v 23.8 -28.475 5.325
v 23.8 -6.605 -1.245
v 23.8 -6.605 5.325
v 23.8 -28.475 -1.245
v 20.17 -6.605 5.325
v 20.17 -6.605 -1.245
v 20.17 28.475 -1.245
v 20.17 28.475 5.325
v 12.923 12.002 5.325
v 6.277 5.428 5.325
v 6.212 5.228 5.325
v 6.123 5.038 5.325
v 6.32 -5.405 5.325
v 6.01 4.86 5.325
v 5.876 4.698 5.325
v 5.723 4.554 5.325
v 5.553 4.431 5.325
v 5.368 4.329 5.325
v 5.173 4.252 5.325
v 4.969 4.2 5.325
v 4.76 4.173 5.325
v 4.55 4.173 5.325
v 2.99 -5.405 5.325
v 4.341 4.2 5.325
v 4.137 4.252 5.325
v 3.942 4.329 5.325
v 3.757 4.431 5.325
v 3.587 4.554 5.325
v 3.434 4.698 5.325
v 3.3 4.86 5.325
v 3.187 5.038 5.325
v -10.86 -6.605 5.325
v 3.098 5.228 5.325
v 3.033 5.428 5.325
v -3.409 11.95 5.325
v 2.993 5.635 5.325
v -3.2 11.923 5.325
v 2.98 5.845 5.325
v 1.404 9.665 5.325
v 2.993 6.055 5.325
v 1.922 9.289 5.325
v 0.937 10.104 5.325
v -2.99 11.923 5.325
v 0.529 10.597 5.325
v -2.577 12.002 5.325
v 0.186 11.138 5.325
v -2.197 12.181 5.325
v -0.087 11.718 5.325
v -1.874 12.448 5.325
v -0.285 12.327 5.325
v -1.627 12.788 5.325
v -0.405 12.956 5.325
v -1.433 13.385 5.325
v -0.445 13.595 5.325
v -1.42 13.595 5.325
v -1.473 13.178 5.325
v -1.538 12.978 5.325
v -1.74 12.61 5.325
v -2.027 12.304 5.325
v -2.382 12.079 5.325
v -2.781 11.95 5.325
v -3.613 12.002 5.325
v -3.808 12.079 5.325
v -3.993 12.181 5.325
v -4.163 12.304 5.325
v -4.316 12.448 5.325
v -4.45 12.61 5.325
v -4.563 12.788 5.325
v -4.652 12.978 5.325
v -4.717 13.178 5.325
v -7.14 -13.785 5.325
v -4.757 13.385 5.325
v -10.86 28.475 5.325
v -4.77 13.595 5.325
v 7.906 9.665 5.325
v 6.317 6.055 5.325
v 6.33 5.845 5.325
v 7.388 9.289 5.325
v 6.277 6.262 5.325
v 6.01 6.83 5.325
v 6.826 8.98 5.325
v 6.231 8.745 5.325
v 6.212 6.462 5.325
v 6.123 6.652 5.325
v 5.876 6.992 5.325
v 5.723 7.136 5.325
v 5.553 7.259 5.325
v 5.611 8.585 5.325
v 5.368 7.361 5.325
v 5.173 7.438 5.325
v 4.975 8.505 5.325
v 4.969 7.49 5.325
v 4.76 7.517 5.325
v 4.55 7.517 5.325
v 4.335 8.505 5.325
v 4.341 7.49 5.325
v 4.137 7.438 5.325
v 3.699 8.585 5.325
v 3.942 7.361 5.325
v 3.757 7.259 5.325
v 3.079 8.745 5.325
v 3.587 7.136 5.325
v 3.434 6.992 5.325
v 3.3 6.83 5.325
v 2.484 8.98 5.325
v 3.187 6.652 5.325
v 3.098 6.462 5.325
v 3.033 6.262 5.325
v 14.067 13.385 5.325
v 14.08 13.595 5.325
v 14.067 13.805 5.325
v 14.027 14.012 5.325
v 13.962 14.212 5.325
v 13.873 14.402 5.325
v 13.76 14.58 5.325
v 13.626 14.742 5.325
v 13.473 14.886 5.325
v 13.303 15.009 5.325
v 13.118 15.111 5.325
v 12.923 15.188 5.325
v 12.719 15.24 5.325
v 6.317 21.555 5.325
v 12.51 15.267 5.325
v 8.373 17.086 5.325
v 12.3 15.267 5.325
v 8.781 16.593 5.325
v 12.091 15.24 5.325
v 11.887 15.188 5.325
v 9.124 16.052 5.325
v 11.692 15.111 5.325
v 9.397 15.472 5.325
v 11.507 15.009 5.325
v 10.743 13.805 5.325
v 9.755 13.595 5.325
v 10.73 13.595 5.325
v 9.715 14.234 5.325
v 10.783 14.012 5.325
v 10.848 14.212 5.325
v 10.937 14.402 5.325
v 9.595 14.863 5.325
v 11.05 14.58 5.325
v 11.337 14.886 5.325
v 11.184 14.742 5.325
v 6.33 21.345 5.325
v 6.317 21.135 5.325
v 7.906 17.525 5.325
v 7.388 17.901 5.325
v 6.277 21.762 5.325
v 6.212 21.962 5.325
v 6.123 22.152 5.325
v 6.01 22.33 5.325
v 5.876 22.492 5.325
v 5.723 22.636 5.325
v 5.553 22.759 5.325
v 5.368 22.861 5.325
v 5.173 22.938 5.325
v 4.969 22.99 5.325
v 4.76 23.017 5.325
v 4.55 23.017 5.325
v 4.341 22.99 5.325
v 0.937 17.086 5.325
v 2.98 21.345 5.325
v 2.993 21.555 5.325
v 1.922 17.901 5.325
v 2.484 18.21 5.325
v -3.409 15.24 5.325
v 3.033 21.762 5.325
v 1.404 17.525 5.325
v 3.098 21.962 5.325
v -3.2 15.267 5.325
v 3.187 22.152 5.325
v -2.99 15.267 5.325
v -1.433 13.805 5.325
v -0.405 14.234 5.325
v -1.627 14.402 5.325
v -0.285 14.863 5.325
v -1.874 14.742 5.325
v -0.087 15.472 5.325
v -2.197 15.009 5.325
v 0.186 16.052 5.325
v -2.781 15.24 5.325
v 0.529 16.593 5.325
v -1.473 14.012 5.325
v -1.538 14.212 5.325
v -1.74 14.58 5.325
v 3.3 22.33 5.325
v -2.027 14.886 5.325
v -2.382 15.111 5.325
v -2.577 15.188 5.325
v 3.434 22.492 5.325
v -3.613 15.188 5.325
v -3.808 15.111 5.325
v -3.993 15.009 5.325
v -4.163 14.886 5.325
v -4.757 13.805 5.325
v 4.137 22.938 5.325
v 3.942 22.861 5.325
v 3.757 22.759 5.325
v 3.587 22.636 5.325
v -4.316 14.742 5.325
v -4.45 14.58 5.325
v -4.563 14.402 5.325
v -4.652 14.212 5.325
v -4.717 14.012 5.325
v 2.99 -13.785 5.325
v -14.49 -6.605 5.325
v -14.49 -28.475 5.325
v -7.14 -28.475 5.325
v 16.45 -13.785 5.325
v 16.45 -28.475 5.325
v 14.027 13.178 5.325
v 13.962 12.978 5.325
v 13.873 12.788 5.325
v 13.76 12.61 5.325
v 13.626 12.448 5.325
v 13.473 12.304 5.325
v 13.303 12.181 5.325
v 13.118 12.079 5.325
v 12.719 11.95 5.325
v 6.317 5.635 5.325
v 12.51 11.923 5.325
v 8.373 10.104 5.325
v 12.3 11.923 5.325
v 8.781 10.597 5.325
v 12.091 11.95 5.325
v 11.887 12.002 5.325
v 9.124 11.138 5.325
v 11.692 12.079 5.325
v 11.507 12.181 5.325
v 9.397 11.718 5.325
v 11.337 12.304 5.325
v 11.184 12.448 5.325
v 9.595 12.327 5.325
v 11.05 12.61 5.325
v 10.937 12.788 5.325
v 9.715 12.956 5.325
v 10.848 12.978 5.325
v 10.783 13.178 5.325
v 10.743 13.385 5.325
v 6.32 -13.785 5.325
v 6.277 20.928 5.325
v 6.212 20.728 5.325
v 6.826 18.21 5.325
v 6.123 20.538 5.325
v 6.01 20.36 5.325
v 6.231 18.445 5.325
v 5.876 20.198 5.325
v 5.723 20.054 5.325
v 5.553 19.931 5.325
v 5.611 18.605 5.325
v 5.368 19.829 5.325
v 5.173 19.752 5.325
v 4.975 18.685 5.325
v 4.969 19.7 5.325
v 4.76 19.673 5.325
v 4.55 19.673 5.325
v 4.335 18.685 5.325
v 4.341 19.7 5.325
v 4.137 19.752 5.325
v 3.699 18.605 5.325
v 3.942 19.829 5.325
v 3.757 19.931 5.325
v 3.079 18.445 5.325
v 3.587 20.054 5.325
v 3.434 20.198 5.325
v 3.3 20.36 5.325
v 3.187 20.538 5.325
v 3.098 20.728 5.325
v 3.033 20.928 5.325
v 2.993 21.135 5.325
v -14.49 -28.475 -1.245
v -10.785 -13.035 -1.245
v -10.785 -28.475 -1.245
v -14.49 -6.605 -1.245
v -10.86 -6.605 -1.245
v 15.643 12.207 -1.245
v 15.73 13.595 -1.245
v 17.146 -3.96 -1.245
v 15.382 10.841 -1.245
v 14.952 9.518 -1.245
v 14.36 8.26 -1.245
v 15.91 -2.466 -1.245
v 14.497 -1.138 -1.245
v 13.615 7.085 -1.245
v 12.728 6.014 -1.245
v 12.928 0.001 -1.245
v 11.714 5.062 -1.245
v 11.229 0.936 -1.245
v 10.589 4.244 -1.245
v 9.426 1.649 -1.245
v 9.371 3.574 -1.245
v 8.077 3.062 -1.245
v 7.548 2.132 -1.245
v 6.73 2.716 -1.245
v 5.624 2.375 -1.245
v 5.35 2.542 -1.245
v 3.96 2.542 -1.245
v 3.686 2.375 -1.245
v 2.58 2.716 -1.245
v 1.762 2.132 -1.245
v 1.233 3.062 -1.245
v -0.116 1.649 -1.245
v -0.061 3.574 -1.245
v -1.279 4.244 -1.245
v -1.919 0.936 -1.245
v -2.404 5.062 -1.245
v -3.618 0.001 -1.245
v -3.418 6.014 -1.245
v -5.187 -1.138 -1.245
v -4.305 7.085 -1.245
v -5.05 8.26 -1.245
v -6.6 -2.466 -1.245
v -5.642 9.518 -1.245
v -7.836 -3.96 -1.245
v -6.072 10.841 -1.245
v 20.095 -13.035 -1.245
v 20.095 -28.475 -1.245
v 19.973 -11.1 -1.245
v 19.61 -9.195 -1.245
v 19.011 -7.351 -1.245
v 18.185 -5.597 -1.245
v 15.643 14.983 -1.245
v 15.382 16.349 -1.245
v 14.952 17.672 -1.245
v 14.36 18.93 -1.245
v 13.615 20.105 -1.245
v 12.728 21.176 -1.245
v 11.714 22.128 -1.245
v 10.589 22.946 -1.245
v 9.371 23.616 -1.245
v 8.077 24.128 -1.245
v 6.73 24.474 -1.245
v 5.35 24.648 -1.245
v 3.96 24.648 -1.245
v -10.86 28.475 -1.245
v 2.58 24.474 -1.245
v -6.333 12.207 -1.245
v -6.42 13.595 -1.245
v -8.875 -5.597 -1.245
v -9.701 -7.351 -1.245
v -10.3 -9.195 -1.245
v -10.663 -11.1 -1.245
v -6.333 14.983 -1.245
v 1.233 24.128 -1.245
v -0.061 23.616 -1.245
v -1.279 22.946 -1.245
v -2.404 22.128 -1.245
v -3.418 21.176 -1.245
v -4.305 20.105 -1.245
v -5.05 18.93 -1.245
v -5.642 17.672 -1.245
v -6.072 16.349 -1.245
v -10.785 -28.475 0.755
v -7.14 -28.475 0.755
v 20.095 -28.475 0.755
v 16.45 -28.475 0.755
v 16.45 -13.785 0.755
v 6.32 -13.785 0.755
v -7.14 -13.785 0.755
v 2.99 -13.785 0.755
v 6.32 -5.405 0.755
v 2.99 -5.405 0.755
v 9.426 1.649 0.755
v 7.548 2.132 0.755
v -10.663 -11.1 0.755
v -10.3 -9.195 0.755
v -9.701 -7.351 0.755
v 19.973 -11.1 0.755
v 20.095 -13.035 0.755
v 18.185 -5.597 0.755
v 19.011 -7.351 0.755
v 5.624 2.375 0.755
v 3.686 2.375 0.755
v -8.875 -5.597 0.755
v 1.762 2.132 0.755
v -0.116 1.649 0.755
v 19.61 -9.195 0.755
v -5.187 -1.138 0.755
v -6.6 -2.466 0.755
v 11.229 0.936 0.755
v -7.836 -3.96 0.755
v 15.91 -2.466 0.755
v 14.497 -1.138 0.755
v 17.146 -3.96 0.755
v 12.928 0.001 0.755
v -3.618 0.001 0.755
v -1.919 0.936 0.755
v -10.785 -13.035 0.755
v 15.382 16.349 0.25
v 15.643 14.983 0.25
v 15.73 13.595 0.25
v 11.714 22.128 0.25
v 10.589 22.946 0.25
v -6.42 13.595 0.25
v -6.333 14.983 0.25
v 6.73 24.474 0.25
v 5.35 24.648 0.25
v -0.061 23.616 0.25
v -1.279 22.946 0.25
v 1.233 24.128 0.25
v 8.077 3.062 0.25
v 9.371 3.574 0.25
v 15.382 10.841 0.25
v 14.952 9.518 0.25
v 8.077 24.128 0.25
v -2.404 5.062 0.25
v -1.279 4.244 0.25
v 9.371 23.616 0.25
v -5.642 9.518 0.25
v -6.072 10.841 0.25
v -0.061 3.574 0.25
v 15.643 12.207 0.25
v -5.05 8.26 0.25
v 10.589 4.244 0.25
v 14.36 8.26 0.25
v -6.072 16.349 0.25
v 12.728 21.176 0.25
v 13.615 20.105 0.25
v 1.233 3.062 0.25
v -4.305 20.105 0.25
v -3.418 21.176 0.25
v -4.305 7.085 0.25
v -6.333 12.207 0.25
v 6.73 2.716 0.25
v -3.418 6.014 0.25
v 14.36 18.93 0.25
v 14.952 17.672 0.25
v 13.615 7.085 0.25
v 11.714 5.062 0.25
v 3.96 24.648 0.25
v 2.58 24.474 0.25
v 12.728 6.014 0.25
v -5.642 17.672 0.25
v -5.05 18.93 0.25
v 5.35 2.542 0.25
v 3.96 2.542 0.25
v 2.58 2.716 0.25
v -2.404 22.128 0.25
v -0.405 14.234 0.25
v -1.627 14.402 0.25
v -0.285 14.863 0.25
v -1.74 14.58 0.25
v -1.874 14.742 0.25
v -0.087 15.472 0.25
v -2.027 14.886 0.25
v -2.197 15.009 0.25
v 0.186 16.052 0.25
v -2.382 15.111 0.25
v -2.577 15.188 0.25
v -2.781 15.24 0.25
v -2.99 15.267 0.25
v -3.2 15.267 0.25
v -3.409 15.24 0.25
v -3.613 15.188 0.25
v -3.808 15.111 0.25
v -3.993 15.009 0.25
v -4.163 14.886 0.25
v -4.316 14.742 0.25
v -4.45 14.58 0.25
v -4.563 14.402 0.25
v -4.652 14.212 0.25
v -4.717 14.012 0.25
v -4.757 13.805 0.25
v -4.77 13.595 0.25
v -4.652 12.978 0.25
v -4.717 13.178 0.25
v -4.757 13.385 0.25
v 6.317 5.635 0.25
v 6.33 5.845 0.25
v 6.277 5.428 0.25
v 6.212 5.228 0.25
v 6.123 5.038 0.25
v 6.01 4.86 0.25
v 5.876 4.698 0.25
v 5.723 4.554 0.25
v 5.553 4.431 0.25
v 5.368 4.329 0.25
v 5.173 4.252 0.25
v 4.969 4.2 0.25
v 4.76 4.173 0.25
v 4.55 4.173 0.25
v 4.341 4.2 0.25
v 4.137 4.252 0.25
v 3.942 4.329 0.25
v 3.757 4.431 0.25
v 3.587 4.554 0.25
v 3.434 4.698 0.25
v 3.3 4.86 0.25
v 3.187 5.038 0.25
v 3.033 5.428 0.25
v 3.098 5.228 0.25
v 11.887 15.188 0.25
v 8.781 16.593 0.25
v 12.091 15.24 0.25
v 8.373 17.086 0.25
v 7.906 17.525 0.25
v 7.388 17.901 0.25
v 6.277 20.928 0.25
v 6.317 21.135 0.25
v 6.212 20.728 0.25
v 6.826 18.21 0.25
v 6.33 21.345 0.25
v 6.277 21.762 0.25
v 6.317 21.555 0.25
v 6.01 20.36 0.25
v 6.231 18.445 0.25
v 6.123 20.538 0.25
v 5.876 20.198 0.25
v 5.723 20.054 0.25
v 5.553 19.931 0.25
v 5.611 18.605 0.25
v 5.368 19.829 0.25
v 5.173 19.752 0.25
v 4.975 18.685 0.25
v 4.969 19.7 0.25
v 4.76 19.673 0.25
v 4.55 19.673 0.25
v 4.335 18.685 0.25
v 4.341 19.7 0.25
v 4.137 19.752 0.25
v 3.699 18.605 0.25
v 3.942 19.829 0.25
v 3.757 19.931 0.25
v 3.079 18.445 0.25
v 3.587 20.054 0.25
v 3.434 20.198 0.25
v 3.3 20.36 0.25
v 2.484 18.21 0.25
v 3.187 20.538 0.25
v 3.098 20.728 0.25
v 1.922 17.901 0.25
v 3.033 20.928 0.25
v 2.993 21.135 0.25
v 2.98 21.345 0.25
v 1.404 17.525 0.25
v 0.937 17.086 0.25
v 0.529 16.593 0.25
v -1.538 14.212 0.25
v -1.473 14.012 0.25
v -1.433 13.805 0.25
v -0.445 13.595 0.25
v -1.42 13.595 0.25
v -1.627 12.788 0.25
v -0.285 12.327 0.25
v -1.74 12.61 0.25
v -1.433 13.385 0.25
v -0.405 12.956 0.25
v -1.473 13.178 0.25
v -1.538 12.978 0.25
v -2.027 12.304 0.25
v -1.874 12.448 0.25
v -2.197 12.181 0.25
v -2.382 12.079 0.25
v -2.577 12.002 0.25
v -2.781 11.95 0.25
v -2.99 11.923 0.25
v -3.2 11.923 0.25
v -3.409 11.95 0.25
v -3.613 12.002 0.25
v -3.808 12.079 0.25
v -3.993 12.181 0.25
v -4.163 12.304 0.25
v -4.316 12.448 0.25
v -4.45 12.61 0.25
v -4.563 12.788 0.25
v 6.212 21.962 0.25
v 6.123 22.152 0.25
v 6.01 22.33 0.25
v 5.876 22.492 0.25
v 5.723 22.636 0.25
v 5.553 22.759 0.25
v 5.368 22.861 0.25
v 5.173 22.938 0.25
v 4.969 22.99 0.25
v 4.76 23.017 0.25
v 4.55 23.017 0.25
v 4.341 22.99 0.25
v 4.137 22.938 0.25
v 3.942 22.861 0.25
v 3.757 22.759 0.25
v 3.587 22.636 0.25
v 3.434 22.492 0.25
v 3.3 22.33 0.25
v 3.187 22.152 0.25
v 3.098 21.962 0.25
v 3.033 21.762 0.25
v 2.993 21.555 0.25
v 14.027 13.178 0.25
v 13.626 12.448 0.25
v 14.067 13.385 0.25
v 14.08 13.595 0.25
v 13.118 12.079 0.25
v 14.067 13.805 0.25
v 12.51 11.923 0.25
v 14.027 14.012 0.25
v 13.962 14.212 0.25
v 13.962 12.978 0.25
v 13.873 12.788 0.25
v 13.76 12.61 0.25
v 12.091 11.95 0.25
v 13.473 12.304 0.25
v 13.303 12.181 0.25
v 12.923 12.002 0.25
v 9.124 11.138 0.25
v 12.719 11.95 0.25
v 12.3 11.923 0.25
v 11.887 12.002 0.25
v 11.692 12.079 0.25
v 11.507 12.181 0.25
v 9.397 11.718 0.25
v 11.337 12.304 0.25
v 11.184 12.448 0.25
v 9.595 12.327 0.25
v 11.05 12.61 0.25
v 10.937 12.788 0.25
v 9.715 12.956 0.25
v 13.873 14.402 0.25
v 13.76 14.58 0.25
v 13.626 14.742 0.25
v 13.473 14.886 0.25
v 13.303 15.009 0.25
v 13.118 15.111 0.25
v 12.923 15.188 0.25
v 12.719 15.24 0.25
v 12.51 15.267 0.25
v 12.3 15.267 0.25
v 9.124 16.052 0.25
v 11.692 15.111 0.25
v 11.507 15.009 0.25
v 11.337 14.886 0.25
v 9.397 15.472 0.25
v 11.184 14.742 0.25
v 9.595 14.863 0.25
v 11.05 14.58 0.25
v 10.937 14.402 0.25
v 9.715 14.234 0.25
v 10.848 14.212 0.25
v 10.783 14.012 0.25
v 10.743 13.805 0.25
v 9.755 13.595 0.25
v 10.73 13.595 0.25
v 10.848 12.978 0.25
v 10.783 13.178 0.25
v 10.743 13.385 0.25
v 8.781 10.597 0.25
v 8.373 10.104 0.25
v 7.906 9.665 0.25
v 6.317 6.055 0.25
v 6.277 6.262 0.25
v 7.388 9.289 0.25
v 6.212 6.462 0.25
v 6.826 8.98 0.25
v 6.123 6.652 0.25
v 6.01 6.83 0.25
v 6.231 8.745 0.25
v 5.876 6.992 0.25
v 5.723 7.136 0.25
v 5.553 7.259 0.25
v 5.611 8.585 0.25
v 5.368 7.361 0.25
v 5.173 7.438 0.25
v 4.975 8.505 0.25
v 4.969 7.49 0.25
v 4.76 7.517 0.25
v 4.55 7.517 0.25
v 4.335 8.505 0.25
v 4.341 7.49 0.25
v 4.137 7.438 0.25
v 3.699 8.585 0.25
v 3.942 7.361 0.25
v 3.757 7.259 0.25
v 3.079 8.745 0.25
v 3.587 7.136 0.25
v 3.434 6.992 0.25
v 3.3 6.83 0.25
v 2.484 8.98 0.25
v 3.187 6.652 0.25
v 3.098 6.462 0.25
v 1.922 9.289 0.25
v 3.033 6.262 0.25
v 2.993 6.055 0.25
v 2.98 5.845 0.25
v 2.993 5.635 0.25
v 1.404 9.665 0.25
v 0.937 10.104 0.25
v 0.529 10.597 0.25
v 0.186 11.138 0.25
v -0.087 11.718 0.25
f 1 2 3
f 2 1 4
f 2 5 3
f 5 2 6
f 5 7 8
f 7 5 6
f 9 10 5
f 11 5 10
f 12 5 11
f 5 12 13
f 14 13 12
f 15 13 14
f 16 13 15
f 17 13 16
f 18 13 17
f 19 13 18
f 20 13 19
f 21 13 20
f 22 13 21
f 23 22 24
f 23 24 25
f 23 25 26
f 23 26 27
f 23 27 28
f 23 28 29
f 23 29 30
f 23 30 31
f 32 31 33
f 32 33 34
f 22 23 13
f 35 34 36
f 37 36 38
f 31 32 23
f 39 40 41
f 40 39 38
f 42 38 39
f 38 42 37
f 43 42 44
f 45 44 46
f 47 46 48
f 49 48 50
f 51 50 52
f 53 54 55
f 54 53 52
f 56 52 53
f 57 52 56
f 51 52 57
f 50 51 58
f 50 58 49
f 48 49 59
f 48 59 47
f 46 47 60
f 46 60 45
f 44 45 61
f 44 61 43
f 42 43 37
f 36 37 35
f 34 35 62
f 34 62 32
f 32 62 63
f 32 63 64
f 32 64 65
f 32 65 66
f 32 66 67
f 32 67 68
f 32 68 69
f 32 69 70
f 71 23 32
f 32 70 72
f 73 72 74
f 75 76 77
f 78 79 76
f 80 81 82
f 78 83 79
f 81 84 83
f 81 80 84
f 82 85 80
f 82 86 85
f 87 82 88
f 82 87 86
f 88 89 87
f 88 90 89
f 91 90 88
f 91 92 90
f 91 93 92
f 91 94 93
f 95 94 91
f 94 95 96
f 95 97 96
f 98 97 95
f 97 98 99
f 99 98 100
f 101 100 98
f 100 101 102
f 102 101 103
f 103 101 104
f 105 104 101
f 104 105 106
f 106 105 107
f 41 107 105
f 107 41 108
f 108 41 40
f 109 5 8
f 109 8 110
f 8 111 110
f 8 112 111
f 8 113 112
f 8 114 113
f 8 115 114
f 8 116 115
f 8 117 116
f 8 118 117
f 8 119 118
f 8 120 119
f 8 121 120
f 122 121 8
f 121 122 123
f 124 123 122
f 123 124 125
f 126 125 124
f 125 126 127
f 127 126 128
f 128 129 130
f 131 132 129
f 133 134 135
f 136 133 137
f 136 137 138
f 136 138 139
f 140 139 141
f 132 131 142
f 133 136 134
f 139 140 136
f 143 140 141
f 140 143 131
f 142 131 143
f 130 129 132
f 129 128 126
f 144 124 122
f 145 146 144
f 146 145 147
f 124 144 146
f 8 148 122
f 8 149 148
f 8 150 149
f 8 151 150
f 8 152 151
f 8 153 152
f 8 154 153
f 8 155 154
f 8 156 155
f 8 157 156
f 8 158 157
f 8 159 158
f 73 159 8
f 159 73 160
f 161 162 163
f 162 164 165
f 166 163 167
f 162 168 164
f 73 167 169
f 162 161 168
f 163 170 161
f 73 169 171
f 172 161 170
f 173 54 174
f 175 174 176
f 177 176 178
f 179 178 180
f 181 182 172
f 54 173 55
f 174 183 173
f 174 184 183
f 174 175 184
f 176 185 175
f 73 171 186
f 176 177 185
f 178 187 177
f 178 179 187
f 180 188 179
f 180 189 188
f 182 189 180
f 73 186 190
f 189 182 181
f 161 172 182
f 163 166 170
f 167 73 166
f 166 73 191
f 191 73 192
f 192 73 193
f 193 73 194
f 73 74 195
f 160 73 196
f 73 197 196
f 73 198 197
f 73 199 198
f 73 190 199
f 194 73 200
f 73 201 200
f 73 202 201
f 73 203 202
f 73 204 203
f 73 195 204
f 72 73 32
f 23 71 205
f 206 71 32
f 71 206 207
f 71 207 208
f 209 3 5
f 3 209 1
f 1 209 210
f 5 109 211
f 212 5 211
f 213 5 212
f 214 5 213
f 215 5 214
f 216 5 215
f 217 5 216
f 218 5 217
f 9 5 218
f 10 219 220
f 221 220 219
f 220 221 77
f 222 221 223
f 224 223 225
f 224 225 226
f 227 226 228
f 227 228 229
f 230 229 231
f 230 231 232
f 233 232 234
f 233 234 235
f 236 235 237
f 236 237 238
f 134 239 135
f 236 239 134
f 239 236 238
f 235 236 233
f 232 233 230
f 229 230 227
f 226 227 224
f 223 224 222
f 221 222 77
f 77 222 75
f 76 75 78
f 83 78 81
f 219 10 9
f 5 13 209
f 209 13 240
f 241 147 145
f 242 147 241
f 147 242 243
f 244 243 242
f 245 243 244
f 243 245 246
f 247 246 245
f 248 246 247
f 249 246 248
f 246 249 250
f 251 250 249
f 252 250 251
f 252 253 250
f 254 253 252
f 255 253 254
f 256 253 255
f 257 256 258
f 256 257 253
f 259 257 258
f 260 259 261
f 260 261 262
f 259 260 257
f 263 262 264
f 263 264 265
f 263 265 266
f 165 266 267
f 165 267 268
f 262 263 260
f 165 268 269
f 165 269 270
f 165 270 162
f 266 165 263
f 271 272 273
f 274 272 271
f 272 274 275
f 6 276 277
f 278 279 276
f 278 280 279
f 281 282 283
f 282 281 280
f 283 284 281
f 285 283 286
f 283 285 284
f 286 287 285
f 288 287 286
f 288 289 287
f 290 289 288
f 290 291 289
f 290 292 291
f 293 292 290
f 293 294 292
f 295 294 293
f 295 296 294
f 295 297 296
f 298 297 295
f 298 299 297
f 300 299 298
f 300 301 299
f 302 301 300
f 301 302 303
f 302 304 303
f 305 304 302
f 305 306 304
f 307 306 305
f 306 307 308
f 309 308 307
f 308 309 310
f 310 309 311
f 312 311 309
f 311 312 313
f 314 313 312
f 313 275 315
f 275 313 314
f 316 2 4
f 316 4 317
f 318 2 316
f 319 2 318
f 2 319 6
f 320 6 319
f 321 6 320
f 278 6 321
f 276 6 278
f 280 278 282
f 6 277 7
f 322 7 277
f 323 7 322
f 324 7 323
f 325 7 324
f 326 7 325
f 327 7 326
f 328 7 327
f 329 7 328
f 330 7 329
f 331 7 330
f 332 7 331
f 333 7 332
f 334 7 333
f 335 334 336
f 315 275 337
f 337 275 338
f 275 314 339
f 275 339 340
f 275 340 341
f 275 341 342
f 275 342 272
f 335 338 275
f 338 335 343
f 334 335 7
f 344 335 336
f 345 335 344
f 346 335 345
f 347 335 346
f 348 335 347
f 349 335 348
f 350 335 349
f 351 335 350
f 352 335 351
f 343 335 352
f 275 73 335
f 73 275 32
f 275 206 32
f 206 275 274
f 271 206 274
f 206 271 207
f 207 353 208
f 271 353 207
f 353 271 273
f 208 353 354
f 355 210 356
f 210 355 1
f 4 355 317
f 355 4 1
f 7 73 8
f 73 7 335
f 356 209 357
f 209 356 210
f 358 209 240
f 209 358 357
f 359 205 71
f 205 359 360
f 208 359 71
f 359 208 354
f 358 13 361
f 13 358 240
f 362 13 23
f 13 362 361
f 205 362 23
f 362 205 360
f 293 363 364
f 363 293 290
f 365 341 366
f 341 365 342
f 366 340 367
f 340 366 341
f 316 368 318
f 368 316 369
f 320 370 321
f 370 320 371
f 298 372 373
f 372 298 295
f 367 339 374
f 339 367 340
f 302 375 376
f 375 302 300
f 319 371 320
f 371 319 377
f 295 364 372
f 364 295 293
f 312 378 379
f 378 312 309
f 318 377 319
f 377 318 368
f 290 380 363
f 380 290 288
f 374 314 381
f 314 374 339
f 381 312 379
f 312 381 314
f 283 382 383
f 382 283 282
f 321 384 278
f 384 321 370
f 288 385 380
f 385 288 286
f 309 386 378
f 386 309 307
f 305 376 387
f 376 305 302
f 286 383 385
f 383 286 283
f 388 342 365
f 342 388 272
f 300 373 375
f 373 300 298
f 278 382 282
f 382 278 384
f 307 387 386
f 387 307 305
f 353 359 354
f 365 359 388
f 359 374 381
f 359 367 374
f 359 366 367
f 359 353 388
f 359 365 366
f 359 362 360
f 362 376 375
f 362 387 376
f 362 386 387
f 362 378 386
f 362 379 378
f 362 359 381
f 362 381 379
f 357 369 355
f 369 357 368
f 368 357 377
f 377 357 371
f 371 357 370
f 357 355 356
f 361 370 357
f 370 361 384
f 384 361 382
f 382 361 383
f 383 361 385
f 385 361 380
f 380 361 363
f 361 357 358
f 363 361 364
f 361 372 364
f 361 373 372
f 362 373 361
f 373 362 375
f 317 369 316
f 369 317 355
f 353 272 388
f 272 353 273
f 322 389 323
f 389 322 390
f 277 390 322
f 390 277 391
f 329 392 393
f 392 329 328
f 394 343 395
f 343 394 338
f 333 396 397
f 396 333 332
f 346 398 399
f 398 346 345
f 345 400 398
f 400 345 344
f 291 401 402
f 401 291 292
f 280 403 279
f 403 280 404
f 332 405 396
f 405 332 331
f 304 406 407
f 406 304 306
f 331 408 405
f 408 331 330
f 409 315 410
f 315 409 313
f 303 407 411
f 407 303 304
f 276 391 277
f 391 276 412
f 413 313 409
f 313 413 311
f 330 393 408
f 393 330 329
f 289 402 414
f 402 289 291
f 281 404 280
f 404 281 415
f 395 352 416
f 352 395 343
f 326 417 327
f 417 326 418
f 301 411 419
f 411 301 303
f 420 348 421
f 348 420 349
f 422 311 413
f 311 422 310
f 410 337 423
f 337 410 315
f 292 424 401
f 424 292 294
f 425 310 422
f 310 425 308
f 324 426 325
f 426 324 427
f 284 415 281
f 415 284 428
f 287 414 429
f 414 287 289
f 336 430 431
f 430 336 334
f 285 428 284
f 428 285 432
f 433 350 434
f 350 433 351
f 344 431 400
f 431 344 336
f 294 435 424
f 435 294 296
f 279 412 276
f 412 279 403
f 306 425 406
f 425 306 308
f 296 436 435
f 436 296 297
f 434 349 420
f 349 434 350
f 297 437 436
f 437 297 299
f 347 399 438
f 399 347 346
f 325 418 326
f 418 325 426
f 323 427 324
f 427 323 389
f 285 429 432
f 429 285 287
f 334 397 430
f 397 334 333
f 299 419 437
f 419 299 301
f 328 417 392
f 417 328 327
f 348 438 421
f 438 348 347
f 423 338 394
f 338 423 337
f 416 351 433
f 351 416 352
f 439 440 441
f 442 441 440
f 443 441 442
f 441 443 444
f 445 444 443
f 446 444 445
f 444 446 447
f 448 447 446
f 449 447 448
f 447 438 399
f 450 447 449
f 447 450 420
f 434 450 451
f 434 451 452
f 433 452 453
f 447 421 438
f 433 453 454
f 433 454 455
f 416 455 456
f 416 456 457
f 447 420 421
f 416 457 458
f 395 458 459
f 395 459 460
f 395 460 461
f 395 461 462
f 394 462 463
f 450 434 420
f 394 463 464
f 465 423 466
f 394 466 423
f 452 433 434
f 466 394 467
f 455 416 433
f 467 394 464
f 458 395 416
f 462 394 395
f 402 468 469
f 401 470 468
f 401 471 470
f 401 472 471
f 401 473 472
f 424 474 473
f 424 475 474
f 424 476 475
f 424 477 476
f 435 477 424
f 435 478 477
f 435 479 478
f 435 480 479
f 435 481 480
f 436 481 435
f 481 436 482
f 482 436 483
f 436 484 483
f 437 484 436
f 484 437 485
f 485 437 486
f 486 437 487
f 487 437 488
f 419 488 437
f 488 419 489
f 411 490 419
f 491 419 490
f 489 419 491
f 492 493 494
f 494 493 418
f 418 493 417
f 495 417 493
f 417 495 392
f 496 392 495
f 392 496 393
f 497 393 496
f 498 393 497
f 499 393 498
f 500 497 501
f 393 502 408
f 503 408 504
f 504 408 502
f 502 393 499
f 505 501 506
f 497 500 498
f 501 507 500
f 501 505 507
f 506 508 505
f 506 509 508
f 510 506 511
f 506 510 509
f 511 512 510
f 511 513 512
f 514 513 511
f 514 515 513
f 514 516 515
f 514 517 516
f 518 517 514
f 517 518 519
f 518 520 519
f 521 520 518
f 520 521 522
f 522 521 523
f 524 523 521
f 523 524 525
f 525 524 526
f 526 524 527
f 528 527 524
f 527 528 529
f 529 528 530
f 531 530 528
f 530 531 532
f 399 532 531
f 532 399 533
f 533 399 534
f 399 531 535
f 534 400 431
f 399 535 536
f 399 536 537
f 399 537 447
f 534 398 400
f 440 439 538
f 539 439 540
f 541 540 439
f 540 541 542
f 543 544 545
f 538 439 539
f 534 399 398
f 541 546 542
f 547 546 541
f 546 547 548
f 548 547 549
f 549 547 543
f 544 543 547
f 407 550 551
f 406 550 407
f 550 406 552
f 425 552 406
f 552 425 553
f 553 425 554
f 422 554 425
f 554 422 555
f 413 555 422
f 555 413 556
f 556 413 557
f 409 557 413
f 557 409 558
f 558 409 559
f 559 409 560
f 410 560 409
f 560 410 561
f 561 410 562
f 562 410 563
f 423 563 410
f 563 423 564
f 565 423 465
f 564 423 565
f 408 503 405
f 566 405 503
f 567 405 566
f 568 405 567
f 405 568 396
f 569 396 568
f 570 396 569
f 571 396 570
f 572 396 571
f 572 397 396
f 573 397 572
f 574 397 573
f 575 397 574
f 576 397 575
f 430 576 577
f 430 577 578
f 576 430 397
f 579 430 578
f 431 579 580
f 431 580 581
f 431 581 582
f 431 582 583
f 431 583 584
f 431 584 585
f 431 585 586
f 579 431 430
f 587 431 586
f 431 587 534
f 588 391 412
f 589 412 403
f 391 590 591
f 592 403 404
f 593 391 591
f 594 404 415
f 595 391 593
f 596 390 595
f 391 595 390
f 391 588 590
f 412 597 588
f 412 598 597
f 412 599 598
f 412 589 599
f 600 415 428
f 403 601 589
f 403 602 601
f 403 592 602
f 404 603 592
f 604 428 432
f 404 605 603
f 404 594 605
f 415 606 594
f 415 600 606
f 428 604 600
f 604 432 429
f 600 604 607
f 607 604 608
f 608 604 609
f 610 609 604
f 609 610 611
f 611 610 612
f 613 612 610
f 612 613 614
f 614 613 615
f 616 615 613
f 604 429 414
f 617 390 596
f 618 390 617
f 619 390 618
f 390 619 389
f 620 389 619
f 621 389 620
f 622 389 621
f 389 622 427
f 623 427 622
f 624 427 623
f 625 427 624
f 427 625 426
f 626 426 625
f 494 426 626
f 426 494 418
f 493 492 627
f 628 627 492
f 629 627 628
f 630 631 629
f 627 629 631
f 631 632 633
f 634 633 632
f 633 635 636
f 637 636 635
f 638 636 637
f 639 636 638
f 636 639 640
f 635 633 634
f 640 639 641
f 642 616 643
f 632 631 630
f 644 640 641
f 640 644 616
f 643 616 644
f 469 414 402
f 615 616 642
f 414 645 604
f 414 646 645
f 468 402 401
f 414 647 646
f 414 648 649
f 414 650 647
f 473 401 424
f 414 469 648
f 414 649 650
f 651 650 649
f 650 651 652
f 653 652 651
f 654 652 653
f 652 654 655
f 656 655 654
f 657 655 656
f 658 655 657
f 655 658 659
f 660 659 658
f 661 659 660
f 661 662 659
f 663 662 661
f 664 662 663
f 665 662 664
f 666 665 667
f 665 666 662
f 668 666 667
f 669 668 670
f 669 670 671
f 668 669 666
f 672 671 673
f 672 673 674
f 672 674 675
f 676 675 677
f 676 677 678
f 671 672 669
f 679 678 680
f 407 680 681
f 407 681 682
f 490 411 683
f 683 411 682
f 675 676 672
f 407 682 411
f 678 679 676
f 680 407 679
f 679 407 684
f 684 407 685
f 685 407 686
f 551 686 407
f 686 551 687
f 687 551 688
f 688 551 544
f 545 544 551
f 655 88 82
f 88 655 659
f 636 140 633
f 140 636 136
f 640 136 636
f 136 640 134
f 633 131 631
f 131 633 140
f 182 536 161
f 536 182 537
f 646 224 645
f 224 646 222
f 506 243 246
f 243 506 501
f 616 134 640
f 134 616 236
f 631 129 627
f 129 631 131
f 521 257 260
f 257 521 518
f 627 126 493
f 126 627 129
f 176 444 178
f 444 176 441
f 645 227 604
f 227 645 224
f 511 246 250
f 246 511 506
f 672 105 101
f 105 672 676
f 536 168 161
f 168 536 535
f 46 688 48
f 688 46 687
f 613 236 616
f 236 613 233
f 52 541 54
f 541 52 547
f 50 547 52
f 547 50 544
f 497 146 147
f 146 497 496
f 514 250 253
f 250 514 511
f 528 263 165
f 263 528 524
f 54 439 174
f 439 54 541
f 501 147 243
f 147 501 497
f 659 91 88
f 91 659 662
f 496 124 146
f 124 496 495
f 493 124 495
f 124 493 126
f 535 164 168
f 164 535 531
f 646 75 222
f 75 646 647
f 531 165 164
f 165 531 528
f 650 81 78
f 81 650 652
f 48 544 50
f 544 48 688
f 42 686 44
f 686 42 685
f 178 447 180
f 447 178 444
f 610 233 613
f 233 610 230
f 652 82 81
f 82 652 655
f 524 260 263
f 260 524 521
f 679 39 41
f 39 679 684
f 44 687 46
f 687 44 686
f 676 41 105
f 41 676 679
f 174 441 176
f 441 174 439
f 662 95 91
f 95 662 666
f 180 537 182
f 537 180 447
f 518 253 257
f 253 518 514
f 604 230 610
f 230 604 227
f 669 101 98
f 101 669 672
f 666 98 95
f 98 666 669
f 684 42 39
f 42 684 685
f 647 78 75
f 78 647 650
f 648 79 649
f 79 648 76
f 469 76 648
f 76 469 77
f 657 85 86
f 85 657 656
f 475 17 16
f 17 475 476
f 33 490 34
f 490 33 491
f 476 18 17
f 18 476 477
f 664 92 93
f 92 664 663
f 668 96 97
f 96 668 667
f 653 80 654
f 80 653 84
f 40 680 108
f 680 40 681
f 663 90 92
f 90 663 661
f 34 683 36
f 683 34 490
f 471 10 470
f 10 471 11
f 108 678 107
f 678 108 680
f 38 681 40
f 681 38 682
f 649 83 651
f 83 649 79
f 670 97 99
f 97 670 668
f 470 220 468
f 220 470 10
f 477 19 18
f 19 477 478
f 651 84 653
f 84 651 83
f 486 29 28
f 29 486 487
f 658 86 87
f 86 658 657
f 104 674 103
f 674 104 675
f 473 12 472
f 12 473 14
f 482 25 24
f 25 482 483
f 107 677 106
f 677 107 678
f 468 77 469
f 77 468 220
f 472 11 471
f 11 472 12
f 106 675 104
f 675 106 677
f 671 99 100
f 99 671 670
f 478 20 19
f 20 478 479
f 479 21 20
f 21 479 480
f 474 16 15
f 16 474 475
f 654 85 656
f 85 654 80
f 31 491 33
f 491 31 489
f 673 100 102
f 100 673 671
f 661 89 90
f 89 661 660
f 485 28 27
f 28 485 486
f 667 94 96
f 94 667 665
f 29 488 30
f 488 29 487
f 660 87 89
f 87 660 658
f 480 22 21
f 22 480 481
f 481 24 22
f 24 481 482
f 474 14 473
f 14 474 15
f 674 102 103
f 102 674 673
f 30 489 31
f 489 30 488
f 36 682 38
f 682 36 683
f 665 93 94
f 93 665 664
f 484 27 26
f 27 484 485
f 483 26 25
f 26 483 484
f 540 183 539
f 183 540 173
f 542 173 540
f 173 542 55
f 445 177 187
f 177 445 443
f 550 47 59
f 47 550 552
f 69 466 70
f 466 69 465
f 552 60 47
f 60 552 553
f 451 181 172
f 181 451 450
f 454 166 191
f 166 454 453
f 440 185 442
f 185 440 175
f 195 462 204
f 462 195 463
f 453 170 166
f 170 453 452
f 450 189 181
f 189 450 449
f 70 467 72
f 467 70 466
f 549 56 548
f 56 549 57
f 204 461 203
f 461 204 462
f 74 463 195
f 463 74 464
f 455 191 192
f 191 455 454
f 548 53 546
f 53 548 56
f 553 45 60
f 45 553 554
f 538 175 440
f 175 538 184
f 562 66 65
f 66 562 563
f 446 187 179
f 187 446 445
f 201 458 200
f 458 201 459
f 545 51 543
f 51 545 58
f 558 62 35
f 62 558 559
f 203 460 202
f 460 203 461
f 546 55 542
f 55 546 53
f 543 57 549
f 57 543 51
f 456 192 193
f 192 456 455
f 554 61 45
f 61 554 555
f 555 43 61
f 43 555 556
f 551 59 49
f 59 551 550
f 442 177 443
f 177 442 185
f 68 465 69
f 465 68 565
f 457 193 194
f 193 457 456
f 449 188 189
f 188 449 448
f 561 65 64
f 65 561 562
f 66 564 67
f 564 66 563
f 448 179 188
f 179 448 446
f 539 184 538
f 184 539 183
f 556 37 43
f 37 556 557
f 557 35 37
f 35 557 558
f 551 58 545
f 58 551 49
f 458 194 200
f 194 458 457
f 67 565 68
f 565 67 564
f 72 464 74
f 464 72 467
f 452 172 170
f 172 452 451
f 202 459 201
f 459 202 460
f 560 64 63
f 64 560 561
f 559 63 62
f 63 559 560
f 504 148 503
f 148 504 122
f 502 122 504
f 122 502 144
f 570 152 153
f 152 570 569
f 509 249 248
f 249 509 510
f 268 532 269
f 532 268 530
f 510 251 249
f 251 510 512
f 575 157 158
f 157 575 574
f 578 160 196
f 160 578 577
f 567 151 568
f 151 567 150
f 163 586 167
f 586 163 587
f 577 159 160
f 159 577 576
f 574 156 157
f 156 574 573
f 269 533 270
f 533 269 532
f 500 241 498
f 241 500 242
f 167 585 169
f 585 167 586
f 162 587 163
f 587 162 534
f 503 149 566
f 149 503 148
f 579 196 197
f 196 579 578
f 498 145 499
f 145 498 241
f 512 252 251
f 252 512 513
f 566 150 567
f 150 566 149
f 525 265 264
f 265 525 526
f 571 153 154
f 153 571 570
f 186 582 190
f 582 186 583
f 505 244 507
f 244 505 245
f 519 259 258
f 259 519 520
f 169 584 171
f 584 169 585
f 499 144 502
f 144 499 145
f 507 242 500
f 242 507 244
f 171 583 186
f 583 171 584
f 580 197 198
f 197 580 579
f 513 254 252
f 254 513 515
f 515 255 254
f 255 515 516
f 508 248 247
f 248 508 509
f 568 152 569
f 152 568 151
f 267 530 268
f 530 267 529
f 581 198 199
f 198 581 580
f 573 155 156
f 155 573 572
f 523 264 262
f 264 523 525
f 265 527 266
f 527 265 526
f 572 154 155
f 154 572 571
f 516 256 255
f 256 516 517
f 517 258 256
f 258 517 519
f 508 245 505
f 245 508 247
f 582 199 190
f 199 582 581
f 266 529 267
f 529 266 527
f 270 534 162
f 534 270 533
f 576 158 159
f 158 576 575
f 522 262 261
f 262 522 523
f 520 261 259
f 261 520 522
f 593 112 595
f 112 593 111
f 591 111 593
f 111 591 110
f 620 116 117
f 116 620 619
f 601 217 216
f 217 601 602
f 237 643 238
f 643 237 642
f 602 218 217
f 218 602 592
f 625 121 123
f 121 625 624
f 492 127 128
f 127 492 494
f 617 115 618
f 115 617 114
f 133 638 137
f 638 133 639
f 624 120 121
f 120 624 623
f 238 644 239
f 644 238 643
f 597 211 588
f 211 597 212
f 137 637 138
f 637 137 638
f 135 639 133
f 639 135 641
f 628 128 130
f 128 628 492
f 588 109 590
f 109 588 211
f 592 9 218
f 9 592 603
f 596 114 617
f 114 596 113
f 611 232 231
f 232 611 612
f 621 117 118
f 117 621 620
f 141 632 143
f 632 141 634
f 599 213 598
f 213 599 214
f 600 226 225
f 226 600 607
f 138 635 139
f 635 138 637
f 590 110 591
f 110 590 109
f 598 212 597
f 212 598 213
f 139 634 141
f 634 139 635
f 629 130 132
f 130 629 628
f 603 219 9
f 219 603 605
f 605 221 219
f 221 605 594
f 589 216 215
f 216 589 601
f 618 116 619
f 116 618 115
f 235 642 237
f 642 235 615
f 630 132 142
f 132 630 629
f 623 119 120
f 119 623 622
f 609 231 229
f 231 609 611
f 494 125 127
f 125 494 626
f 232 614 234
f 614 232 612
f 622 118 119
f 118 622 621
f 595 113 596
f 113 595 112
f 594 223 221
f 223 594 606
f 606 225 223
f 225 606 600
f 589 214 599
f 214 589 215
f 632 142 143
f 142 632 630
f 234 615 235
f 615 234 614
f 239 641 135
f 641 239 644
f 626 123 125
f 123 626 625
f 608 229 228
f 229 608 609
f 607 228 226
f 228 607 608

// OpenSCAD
$fn=50;


height=59.35 - 2.4;
width=47.60;
thickness=10.65;

topWidth=38.29;
topHeight=23.70;
bottomWidth=31.10;
bottomHeight=height-topHeight;
thickness3=6.57; //thickness of support**



diameter=28.88;



circleThickness=2;
radius=diameter/2 + 1;

smallRecHeight=8.38;
smallRecWidth=3.33;
cuttingWidth=23.59;
cuttingHeight=14.69;
extraHeight = (height - (smallRecHeight + cuttingHeight));
extraWidth = 3.63; // width of axis board

bigCircleDiameter=27.33;
topHalfHeight=29.63;
remaindingHeight=height-topHalfHeight;

hex_nut_diameter=7.89 + 1.6; // +1.6, 
hex_nut_radius=hex_nut_diameter/2;
hex_nut_thickness=3.85;

hex_nut_inner_diameter= 5.8;//5;
hex_nut_inner_radius=hex_nut_inner_diameter/2 + .4;



temp=(thickness/2) - (thickness - thickness3);
offsetFromCenter=19; //19.25; //1.5 // 2.3
hexNutGroveExtraDepth=2;

screwRadius=1.75;
screwDepth=19.35; //increase depth

module part1(){
translate([(width/2) - (topWidth/2) ,(thickness/2) - (thickness3)/2,0]) color("blue") difference(){    
    difference(){
cube([topWidth, thickness3, height], center=true);  

union(){
color("blue") translate([topWidth/2 - (extraWidth/2),0,-extraHeight/2 + ( (height/2) - (smallRecHeight + cuttingHeight) )]) cube([extraWidth,thickness3 ,extraHeight+2.4],center=true);

color("blue") translate([ -(topWidth/2 - (extraWidth/2)),0,-extraHeight/2 + ( (height/2) - (smallRecHeight + cuttingHeight) )]) cube([extraWidth,thickness3 ,extraHeight+2.4],center=true);
}


//translate([0,0,extraHeight - (height/2) - offsetFromCenter]) union(){
//    //-(remaindingHeight/2) + (hex_nut_radius)
//translate([0,5,0]) color("black") rotate([90,0,0]) cylinder(h=hex_nut_thickness/2 + hexNutGroveExtraDepth + 1.3, r=hex_nut_radius,center=true, $fn = 6); //h=thickness3
////-(remaindingHeight/2) + (hex_nut_inner_radius + (hex_nut_radius - hex_nut_inner_radius))
//translate([0, 0,0]) color("red") rotate([90,0,0]) cylinder(h=hex_nut_thickness/2 + 10, r=hex_nut_inner_radius,center=true, $fn = 6);
//}


}
union(){
    translate([0,-((-(thickness3/2)+(thickness3-circleThickness)/2)),(height/2) - (smallRecHeight + cuttingHeight) ]) union(){
translate([0,0,(cuttingHeight/2) + (smallRecHeight)]) cube([cuttingWidth,thickness3 - circleThickness +.1, cuttingHeight],center=true);
                 translate([0,0,smallRecHeight/2]) cube([smallRecWidth,thickness3 - circleThickness+.1,smallRecHeight],center=true);            
}


translate([0,-(thickness3/2 - (circleThickness/2)),(height/2) - (radius)]) color("red")rotate([90,0,0])union(){
        cylinder(h=circleThickness, r=radius, center=true);
        translate([0,radius/2,0])cube([radius*2,radius,circleThickness],center=true);
    }
    
    }

}
}


module part2(){
//translate([0,temp,0]) 
difference(){
translate([0,-5,0]) color("blue")
cube([width,thickness,height],center=true);
//translate([0,(thickness/2) - (thickness - thickness3)/2,0]) color("blue") cube([topWidth,thickness - thickness3,height],center=true);
//
translate([(width/2) - (topWidth/2),(thickness/2) - (thickness3)/2,0]) color("blue") union(){
cube([topWidth, thickness3, height], center=true);   
union(){
color("red") translate([topWidth/2 - (extraWidth/2),0,-extraHeight/2 + ( (height/2) - (smallRecHeight + cuttingHeight) )]) cube([extraWidth,thickness3+20 ,extraHeight+2.4],center=true); //slot **

color("red") translate([ -(topWidth/2 - (extraWidth/2))-0.5,0,-extraHeight/2 + ( (height/2) - (smallRecHeight + cuttingHeight) )]) cube([extraWidth+0.5,thickness3+20,extraHeight+2.4],center=true);
}


//translate([0,0, extraHeight - (height/2)  - offsetFromCenter]) union(){
//    
//translate([0, -temp - (hex_nut_thickness/2) - .8,0]) color("red") rotate([90,0,0]) cylinder(h=hex_nut_thickness/2 + hexNutGroveExtraDepth, r=hex_nut_radius,center=true, $fn = 6);
//
//translate([0, -temp - (hex_nut_thickness/2),0]) color("red") rotate([90,0,0]) cylinder(h=hex_nut_thickness/2 + 7, r=hex_nut_inner_radius,center=true, $fn = 6);
//}


}
}

}

module glueScrews(){
translate([0,0.1,0]) union(){
rotate([90,0,0]) translate([(width/2) - (topWidth/2) - (topWidth/4),-(height/3),-(thickness-screwDepth)/2]) cylinder(h=screwDepth,r=screwRadius,center=true);

rotate([90,0,0]) translate([(width/2) - (topWidth/2) + (topWidth/4),-(height/9),-(thickness-screwDepth)/2]) cylinder(h=screwDepth,r=screwRadius,center=true);
}
}


module modifiedParts(part=1){


difference(){
    
        if(part == 1){
            part1();
        }else if(part == 2){
            part2();
        }
//        part2();    

    
//translate([(width/2) - (topWidth/2),0,extraHeight - (height/2) - offsetFromCenter]) union(){
//    //-(remaindingHeight/2) + (hex_nut_radius)
//    
//    //((hex_nut_thickness/2 + 10)/2)-(hex_nut_thickness/2 + hexNutGroveExtraDepth + 1.3)/2
//
//    
////-(remaindingHeight/2) + (hex_nut_inner_radius + (hex_nut_radius - hex_nut_inner_radius))
//
//
//translate([0,0,0]) color("black") rotate([90,0,0]) cylinder(h=hex_nut_thickness, r=hex_nut_radius,center=true, $fn = 6); //h=thickness3
//
//translate([0, 0,0]) color("red") rotate([90,0,0]) cylinder(h=hex_nut_thickness+ 20, r=hex_nut_inner_radius,center=true, $fn = 6);
//    
//
////    glueScrews();
//}

}
}

//translate([3.5,11,0]) cylinder(d=21.95,h=3.5,$fn=50,center=true);

//translate([(width/2) - (topWidth/2),-(extraHeight - (height/2) - offsetFromCenter),0]) cylinder(d=21.95,h=3.5,$fn=50,center=true);

//union(){
//translate([(width/2) - (topWidth/2),-(extraHeight - (height/2) - offsetFromCenter)-7.75,0]) cylinder(h=15,d=3.75,center=true);
//translate([(width/2) - (topWidth/2) -7.75,-(extraHeight - (height/2) - offsetFromCenter),0]) cylinder(h=15,d=3.75,center=true);
//translate([(width/2) - (topWidth/2) +7.75,-(extraHeight - (height/2) - offsetFromCenter),0]) cylinder(h=15,d=3.75,center=true);
//translate([(width/2) - (topWidth/2) ,-(extraHeight - (height/2) - offsetFromCenter) + 7.75,0]) cylinder(h=15,d=3.75,center=true);
//}


//rotate([-90,0,0]) difference(){
//modifiedParts(1);
//   glueScrews(); 
//}

//rotate([90,0,0]) translate([(width/2) - (topWidth/2),-(0),extraHeight - (height/2) - offsetFromCenter]) cylinder(d=21.95,h=3.5,$fn=50,center=true);

//rotate([90,0,0]) modifiedParts(1);

difference(){
difference(){
rotate([90,0,0]) difference(){

modifiedParts();
//    translate([(width/2) - (topWidth/2),-(extraHeight - (height/2) - offsetFromCenter),0]) cylinder(d=21.95,h=3.5,$fn=50,center=true);
//    glueScrews();
    
}

difference(){
//translate([0,0,.85])
    union(){
//translate([(width/2) - (topWidth/2),-(extraHeight - (height/2) - offsetFromCenter) ,-1.5]) cylinder(d=21.95 + .2,h=3.5,$fn=50,center=true);
//    
//    translate([(width/2) - (topWidth/2),-(extraHeight - (height/2) - offsetFromCenter),0]) cylinder(h=15,d=10 + .2,center=true);
    
    translate([(width/2) - (topWidth/2),-(extraHeight - (height/2) - offsetFromCenter) ,-1.5]) cylinder(d=21.95 + .2,h=3.5,$fn=50,center=true);
    
    translate([(width/2) - (topWidth/2),-(extraHeight - (height/2) - offsetFromCenter),0]) cylinder(h=25,d=10 + .2,center=true);
}


}

}


union(){
translate([(width/2) - (topWidth/2),-(extraHeight - (height/2) - offsetFromCenter)-7.75 ,0]) cylinder(h=25,d=3.75 - .4,center=true);
translate([(width/2) - (topWidth/2) -7.75 ,-(extraHeight - (height/2) - offsetFromCenter),0]) cylinder(h=25,d=3.75 - .4,center=true);
translate([(width/2) - (topWidth/2) ,-(extraHeight - (height/2) - offsetFromCenter) + 7.75 ,0]) cylinder(h=25,d=3.75 - .4,center=true);
translate([(width/2) - (topWidth/2) +7.75 ,-(extraHeight - (height/2) - offsetFromCenter),0]) cylinder(h=25,d=3.75 - .4,center=true);

}

}
